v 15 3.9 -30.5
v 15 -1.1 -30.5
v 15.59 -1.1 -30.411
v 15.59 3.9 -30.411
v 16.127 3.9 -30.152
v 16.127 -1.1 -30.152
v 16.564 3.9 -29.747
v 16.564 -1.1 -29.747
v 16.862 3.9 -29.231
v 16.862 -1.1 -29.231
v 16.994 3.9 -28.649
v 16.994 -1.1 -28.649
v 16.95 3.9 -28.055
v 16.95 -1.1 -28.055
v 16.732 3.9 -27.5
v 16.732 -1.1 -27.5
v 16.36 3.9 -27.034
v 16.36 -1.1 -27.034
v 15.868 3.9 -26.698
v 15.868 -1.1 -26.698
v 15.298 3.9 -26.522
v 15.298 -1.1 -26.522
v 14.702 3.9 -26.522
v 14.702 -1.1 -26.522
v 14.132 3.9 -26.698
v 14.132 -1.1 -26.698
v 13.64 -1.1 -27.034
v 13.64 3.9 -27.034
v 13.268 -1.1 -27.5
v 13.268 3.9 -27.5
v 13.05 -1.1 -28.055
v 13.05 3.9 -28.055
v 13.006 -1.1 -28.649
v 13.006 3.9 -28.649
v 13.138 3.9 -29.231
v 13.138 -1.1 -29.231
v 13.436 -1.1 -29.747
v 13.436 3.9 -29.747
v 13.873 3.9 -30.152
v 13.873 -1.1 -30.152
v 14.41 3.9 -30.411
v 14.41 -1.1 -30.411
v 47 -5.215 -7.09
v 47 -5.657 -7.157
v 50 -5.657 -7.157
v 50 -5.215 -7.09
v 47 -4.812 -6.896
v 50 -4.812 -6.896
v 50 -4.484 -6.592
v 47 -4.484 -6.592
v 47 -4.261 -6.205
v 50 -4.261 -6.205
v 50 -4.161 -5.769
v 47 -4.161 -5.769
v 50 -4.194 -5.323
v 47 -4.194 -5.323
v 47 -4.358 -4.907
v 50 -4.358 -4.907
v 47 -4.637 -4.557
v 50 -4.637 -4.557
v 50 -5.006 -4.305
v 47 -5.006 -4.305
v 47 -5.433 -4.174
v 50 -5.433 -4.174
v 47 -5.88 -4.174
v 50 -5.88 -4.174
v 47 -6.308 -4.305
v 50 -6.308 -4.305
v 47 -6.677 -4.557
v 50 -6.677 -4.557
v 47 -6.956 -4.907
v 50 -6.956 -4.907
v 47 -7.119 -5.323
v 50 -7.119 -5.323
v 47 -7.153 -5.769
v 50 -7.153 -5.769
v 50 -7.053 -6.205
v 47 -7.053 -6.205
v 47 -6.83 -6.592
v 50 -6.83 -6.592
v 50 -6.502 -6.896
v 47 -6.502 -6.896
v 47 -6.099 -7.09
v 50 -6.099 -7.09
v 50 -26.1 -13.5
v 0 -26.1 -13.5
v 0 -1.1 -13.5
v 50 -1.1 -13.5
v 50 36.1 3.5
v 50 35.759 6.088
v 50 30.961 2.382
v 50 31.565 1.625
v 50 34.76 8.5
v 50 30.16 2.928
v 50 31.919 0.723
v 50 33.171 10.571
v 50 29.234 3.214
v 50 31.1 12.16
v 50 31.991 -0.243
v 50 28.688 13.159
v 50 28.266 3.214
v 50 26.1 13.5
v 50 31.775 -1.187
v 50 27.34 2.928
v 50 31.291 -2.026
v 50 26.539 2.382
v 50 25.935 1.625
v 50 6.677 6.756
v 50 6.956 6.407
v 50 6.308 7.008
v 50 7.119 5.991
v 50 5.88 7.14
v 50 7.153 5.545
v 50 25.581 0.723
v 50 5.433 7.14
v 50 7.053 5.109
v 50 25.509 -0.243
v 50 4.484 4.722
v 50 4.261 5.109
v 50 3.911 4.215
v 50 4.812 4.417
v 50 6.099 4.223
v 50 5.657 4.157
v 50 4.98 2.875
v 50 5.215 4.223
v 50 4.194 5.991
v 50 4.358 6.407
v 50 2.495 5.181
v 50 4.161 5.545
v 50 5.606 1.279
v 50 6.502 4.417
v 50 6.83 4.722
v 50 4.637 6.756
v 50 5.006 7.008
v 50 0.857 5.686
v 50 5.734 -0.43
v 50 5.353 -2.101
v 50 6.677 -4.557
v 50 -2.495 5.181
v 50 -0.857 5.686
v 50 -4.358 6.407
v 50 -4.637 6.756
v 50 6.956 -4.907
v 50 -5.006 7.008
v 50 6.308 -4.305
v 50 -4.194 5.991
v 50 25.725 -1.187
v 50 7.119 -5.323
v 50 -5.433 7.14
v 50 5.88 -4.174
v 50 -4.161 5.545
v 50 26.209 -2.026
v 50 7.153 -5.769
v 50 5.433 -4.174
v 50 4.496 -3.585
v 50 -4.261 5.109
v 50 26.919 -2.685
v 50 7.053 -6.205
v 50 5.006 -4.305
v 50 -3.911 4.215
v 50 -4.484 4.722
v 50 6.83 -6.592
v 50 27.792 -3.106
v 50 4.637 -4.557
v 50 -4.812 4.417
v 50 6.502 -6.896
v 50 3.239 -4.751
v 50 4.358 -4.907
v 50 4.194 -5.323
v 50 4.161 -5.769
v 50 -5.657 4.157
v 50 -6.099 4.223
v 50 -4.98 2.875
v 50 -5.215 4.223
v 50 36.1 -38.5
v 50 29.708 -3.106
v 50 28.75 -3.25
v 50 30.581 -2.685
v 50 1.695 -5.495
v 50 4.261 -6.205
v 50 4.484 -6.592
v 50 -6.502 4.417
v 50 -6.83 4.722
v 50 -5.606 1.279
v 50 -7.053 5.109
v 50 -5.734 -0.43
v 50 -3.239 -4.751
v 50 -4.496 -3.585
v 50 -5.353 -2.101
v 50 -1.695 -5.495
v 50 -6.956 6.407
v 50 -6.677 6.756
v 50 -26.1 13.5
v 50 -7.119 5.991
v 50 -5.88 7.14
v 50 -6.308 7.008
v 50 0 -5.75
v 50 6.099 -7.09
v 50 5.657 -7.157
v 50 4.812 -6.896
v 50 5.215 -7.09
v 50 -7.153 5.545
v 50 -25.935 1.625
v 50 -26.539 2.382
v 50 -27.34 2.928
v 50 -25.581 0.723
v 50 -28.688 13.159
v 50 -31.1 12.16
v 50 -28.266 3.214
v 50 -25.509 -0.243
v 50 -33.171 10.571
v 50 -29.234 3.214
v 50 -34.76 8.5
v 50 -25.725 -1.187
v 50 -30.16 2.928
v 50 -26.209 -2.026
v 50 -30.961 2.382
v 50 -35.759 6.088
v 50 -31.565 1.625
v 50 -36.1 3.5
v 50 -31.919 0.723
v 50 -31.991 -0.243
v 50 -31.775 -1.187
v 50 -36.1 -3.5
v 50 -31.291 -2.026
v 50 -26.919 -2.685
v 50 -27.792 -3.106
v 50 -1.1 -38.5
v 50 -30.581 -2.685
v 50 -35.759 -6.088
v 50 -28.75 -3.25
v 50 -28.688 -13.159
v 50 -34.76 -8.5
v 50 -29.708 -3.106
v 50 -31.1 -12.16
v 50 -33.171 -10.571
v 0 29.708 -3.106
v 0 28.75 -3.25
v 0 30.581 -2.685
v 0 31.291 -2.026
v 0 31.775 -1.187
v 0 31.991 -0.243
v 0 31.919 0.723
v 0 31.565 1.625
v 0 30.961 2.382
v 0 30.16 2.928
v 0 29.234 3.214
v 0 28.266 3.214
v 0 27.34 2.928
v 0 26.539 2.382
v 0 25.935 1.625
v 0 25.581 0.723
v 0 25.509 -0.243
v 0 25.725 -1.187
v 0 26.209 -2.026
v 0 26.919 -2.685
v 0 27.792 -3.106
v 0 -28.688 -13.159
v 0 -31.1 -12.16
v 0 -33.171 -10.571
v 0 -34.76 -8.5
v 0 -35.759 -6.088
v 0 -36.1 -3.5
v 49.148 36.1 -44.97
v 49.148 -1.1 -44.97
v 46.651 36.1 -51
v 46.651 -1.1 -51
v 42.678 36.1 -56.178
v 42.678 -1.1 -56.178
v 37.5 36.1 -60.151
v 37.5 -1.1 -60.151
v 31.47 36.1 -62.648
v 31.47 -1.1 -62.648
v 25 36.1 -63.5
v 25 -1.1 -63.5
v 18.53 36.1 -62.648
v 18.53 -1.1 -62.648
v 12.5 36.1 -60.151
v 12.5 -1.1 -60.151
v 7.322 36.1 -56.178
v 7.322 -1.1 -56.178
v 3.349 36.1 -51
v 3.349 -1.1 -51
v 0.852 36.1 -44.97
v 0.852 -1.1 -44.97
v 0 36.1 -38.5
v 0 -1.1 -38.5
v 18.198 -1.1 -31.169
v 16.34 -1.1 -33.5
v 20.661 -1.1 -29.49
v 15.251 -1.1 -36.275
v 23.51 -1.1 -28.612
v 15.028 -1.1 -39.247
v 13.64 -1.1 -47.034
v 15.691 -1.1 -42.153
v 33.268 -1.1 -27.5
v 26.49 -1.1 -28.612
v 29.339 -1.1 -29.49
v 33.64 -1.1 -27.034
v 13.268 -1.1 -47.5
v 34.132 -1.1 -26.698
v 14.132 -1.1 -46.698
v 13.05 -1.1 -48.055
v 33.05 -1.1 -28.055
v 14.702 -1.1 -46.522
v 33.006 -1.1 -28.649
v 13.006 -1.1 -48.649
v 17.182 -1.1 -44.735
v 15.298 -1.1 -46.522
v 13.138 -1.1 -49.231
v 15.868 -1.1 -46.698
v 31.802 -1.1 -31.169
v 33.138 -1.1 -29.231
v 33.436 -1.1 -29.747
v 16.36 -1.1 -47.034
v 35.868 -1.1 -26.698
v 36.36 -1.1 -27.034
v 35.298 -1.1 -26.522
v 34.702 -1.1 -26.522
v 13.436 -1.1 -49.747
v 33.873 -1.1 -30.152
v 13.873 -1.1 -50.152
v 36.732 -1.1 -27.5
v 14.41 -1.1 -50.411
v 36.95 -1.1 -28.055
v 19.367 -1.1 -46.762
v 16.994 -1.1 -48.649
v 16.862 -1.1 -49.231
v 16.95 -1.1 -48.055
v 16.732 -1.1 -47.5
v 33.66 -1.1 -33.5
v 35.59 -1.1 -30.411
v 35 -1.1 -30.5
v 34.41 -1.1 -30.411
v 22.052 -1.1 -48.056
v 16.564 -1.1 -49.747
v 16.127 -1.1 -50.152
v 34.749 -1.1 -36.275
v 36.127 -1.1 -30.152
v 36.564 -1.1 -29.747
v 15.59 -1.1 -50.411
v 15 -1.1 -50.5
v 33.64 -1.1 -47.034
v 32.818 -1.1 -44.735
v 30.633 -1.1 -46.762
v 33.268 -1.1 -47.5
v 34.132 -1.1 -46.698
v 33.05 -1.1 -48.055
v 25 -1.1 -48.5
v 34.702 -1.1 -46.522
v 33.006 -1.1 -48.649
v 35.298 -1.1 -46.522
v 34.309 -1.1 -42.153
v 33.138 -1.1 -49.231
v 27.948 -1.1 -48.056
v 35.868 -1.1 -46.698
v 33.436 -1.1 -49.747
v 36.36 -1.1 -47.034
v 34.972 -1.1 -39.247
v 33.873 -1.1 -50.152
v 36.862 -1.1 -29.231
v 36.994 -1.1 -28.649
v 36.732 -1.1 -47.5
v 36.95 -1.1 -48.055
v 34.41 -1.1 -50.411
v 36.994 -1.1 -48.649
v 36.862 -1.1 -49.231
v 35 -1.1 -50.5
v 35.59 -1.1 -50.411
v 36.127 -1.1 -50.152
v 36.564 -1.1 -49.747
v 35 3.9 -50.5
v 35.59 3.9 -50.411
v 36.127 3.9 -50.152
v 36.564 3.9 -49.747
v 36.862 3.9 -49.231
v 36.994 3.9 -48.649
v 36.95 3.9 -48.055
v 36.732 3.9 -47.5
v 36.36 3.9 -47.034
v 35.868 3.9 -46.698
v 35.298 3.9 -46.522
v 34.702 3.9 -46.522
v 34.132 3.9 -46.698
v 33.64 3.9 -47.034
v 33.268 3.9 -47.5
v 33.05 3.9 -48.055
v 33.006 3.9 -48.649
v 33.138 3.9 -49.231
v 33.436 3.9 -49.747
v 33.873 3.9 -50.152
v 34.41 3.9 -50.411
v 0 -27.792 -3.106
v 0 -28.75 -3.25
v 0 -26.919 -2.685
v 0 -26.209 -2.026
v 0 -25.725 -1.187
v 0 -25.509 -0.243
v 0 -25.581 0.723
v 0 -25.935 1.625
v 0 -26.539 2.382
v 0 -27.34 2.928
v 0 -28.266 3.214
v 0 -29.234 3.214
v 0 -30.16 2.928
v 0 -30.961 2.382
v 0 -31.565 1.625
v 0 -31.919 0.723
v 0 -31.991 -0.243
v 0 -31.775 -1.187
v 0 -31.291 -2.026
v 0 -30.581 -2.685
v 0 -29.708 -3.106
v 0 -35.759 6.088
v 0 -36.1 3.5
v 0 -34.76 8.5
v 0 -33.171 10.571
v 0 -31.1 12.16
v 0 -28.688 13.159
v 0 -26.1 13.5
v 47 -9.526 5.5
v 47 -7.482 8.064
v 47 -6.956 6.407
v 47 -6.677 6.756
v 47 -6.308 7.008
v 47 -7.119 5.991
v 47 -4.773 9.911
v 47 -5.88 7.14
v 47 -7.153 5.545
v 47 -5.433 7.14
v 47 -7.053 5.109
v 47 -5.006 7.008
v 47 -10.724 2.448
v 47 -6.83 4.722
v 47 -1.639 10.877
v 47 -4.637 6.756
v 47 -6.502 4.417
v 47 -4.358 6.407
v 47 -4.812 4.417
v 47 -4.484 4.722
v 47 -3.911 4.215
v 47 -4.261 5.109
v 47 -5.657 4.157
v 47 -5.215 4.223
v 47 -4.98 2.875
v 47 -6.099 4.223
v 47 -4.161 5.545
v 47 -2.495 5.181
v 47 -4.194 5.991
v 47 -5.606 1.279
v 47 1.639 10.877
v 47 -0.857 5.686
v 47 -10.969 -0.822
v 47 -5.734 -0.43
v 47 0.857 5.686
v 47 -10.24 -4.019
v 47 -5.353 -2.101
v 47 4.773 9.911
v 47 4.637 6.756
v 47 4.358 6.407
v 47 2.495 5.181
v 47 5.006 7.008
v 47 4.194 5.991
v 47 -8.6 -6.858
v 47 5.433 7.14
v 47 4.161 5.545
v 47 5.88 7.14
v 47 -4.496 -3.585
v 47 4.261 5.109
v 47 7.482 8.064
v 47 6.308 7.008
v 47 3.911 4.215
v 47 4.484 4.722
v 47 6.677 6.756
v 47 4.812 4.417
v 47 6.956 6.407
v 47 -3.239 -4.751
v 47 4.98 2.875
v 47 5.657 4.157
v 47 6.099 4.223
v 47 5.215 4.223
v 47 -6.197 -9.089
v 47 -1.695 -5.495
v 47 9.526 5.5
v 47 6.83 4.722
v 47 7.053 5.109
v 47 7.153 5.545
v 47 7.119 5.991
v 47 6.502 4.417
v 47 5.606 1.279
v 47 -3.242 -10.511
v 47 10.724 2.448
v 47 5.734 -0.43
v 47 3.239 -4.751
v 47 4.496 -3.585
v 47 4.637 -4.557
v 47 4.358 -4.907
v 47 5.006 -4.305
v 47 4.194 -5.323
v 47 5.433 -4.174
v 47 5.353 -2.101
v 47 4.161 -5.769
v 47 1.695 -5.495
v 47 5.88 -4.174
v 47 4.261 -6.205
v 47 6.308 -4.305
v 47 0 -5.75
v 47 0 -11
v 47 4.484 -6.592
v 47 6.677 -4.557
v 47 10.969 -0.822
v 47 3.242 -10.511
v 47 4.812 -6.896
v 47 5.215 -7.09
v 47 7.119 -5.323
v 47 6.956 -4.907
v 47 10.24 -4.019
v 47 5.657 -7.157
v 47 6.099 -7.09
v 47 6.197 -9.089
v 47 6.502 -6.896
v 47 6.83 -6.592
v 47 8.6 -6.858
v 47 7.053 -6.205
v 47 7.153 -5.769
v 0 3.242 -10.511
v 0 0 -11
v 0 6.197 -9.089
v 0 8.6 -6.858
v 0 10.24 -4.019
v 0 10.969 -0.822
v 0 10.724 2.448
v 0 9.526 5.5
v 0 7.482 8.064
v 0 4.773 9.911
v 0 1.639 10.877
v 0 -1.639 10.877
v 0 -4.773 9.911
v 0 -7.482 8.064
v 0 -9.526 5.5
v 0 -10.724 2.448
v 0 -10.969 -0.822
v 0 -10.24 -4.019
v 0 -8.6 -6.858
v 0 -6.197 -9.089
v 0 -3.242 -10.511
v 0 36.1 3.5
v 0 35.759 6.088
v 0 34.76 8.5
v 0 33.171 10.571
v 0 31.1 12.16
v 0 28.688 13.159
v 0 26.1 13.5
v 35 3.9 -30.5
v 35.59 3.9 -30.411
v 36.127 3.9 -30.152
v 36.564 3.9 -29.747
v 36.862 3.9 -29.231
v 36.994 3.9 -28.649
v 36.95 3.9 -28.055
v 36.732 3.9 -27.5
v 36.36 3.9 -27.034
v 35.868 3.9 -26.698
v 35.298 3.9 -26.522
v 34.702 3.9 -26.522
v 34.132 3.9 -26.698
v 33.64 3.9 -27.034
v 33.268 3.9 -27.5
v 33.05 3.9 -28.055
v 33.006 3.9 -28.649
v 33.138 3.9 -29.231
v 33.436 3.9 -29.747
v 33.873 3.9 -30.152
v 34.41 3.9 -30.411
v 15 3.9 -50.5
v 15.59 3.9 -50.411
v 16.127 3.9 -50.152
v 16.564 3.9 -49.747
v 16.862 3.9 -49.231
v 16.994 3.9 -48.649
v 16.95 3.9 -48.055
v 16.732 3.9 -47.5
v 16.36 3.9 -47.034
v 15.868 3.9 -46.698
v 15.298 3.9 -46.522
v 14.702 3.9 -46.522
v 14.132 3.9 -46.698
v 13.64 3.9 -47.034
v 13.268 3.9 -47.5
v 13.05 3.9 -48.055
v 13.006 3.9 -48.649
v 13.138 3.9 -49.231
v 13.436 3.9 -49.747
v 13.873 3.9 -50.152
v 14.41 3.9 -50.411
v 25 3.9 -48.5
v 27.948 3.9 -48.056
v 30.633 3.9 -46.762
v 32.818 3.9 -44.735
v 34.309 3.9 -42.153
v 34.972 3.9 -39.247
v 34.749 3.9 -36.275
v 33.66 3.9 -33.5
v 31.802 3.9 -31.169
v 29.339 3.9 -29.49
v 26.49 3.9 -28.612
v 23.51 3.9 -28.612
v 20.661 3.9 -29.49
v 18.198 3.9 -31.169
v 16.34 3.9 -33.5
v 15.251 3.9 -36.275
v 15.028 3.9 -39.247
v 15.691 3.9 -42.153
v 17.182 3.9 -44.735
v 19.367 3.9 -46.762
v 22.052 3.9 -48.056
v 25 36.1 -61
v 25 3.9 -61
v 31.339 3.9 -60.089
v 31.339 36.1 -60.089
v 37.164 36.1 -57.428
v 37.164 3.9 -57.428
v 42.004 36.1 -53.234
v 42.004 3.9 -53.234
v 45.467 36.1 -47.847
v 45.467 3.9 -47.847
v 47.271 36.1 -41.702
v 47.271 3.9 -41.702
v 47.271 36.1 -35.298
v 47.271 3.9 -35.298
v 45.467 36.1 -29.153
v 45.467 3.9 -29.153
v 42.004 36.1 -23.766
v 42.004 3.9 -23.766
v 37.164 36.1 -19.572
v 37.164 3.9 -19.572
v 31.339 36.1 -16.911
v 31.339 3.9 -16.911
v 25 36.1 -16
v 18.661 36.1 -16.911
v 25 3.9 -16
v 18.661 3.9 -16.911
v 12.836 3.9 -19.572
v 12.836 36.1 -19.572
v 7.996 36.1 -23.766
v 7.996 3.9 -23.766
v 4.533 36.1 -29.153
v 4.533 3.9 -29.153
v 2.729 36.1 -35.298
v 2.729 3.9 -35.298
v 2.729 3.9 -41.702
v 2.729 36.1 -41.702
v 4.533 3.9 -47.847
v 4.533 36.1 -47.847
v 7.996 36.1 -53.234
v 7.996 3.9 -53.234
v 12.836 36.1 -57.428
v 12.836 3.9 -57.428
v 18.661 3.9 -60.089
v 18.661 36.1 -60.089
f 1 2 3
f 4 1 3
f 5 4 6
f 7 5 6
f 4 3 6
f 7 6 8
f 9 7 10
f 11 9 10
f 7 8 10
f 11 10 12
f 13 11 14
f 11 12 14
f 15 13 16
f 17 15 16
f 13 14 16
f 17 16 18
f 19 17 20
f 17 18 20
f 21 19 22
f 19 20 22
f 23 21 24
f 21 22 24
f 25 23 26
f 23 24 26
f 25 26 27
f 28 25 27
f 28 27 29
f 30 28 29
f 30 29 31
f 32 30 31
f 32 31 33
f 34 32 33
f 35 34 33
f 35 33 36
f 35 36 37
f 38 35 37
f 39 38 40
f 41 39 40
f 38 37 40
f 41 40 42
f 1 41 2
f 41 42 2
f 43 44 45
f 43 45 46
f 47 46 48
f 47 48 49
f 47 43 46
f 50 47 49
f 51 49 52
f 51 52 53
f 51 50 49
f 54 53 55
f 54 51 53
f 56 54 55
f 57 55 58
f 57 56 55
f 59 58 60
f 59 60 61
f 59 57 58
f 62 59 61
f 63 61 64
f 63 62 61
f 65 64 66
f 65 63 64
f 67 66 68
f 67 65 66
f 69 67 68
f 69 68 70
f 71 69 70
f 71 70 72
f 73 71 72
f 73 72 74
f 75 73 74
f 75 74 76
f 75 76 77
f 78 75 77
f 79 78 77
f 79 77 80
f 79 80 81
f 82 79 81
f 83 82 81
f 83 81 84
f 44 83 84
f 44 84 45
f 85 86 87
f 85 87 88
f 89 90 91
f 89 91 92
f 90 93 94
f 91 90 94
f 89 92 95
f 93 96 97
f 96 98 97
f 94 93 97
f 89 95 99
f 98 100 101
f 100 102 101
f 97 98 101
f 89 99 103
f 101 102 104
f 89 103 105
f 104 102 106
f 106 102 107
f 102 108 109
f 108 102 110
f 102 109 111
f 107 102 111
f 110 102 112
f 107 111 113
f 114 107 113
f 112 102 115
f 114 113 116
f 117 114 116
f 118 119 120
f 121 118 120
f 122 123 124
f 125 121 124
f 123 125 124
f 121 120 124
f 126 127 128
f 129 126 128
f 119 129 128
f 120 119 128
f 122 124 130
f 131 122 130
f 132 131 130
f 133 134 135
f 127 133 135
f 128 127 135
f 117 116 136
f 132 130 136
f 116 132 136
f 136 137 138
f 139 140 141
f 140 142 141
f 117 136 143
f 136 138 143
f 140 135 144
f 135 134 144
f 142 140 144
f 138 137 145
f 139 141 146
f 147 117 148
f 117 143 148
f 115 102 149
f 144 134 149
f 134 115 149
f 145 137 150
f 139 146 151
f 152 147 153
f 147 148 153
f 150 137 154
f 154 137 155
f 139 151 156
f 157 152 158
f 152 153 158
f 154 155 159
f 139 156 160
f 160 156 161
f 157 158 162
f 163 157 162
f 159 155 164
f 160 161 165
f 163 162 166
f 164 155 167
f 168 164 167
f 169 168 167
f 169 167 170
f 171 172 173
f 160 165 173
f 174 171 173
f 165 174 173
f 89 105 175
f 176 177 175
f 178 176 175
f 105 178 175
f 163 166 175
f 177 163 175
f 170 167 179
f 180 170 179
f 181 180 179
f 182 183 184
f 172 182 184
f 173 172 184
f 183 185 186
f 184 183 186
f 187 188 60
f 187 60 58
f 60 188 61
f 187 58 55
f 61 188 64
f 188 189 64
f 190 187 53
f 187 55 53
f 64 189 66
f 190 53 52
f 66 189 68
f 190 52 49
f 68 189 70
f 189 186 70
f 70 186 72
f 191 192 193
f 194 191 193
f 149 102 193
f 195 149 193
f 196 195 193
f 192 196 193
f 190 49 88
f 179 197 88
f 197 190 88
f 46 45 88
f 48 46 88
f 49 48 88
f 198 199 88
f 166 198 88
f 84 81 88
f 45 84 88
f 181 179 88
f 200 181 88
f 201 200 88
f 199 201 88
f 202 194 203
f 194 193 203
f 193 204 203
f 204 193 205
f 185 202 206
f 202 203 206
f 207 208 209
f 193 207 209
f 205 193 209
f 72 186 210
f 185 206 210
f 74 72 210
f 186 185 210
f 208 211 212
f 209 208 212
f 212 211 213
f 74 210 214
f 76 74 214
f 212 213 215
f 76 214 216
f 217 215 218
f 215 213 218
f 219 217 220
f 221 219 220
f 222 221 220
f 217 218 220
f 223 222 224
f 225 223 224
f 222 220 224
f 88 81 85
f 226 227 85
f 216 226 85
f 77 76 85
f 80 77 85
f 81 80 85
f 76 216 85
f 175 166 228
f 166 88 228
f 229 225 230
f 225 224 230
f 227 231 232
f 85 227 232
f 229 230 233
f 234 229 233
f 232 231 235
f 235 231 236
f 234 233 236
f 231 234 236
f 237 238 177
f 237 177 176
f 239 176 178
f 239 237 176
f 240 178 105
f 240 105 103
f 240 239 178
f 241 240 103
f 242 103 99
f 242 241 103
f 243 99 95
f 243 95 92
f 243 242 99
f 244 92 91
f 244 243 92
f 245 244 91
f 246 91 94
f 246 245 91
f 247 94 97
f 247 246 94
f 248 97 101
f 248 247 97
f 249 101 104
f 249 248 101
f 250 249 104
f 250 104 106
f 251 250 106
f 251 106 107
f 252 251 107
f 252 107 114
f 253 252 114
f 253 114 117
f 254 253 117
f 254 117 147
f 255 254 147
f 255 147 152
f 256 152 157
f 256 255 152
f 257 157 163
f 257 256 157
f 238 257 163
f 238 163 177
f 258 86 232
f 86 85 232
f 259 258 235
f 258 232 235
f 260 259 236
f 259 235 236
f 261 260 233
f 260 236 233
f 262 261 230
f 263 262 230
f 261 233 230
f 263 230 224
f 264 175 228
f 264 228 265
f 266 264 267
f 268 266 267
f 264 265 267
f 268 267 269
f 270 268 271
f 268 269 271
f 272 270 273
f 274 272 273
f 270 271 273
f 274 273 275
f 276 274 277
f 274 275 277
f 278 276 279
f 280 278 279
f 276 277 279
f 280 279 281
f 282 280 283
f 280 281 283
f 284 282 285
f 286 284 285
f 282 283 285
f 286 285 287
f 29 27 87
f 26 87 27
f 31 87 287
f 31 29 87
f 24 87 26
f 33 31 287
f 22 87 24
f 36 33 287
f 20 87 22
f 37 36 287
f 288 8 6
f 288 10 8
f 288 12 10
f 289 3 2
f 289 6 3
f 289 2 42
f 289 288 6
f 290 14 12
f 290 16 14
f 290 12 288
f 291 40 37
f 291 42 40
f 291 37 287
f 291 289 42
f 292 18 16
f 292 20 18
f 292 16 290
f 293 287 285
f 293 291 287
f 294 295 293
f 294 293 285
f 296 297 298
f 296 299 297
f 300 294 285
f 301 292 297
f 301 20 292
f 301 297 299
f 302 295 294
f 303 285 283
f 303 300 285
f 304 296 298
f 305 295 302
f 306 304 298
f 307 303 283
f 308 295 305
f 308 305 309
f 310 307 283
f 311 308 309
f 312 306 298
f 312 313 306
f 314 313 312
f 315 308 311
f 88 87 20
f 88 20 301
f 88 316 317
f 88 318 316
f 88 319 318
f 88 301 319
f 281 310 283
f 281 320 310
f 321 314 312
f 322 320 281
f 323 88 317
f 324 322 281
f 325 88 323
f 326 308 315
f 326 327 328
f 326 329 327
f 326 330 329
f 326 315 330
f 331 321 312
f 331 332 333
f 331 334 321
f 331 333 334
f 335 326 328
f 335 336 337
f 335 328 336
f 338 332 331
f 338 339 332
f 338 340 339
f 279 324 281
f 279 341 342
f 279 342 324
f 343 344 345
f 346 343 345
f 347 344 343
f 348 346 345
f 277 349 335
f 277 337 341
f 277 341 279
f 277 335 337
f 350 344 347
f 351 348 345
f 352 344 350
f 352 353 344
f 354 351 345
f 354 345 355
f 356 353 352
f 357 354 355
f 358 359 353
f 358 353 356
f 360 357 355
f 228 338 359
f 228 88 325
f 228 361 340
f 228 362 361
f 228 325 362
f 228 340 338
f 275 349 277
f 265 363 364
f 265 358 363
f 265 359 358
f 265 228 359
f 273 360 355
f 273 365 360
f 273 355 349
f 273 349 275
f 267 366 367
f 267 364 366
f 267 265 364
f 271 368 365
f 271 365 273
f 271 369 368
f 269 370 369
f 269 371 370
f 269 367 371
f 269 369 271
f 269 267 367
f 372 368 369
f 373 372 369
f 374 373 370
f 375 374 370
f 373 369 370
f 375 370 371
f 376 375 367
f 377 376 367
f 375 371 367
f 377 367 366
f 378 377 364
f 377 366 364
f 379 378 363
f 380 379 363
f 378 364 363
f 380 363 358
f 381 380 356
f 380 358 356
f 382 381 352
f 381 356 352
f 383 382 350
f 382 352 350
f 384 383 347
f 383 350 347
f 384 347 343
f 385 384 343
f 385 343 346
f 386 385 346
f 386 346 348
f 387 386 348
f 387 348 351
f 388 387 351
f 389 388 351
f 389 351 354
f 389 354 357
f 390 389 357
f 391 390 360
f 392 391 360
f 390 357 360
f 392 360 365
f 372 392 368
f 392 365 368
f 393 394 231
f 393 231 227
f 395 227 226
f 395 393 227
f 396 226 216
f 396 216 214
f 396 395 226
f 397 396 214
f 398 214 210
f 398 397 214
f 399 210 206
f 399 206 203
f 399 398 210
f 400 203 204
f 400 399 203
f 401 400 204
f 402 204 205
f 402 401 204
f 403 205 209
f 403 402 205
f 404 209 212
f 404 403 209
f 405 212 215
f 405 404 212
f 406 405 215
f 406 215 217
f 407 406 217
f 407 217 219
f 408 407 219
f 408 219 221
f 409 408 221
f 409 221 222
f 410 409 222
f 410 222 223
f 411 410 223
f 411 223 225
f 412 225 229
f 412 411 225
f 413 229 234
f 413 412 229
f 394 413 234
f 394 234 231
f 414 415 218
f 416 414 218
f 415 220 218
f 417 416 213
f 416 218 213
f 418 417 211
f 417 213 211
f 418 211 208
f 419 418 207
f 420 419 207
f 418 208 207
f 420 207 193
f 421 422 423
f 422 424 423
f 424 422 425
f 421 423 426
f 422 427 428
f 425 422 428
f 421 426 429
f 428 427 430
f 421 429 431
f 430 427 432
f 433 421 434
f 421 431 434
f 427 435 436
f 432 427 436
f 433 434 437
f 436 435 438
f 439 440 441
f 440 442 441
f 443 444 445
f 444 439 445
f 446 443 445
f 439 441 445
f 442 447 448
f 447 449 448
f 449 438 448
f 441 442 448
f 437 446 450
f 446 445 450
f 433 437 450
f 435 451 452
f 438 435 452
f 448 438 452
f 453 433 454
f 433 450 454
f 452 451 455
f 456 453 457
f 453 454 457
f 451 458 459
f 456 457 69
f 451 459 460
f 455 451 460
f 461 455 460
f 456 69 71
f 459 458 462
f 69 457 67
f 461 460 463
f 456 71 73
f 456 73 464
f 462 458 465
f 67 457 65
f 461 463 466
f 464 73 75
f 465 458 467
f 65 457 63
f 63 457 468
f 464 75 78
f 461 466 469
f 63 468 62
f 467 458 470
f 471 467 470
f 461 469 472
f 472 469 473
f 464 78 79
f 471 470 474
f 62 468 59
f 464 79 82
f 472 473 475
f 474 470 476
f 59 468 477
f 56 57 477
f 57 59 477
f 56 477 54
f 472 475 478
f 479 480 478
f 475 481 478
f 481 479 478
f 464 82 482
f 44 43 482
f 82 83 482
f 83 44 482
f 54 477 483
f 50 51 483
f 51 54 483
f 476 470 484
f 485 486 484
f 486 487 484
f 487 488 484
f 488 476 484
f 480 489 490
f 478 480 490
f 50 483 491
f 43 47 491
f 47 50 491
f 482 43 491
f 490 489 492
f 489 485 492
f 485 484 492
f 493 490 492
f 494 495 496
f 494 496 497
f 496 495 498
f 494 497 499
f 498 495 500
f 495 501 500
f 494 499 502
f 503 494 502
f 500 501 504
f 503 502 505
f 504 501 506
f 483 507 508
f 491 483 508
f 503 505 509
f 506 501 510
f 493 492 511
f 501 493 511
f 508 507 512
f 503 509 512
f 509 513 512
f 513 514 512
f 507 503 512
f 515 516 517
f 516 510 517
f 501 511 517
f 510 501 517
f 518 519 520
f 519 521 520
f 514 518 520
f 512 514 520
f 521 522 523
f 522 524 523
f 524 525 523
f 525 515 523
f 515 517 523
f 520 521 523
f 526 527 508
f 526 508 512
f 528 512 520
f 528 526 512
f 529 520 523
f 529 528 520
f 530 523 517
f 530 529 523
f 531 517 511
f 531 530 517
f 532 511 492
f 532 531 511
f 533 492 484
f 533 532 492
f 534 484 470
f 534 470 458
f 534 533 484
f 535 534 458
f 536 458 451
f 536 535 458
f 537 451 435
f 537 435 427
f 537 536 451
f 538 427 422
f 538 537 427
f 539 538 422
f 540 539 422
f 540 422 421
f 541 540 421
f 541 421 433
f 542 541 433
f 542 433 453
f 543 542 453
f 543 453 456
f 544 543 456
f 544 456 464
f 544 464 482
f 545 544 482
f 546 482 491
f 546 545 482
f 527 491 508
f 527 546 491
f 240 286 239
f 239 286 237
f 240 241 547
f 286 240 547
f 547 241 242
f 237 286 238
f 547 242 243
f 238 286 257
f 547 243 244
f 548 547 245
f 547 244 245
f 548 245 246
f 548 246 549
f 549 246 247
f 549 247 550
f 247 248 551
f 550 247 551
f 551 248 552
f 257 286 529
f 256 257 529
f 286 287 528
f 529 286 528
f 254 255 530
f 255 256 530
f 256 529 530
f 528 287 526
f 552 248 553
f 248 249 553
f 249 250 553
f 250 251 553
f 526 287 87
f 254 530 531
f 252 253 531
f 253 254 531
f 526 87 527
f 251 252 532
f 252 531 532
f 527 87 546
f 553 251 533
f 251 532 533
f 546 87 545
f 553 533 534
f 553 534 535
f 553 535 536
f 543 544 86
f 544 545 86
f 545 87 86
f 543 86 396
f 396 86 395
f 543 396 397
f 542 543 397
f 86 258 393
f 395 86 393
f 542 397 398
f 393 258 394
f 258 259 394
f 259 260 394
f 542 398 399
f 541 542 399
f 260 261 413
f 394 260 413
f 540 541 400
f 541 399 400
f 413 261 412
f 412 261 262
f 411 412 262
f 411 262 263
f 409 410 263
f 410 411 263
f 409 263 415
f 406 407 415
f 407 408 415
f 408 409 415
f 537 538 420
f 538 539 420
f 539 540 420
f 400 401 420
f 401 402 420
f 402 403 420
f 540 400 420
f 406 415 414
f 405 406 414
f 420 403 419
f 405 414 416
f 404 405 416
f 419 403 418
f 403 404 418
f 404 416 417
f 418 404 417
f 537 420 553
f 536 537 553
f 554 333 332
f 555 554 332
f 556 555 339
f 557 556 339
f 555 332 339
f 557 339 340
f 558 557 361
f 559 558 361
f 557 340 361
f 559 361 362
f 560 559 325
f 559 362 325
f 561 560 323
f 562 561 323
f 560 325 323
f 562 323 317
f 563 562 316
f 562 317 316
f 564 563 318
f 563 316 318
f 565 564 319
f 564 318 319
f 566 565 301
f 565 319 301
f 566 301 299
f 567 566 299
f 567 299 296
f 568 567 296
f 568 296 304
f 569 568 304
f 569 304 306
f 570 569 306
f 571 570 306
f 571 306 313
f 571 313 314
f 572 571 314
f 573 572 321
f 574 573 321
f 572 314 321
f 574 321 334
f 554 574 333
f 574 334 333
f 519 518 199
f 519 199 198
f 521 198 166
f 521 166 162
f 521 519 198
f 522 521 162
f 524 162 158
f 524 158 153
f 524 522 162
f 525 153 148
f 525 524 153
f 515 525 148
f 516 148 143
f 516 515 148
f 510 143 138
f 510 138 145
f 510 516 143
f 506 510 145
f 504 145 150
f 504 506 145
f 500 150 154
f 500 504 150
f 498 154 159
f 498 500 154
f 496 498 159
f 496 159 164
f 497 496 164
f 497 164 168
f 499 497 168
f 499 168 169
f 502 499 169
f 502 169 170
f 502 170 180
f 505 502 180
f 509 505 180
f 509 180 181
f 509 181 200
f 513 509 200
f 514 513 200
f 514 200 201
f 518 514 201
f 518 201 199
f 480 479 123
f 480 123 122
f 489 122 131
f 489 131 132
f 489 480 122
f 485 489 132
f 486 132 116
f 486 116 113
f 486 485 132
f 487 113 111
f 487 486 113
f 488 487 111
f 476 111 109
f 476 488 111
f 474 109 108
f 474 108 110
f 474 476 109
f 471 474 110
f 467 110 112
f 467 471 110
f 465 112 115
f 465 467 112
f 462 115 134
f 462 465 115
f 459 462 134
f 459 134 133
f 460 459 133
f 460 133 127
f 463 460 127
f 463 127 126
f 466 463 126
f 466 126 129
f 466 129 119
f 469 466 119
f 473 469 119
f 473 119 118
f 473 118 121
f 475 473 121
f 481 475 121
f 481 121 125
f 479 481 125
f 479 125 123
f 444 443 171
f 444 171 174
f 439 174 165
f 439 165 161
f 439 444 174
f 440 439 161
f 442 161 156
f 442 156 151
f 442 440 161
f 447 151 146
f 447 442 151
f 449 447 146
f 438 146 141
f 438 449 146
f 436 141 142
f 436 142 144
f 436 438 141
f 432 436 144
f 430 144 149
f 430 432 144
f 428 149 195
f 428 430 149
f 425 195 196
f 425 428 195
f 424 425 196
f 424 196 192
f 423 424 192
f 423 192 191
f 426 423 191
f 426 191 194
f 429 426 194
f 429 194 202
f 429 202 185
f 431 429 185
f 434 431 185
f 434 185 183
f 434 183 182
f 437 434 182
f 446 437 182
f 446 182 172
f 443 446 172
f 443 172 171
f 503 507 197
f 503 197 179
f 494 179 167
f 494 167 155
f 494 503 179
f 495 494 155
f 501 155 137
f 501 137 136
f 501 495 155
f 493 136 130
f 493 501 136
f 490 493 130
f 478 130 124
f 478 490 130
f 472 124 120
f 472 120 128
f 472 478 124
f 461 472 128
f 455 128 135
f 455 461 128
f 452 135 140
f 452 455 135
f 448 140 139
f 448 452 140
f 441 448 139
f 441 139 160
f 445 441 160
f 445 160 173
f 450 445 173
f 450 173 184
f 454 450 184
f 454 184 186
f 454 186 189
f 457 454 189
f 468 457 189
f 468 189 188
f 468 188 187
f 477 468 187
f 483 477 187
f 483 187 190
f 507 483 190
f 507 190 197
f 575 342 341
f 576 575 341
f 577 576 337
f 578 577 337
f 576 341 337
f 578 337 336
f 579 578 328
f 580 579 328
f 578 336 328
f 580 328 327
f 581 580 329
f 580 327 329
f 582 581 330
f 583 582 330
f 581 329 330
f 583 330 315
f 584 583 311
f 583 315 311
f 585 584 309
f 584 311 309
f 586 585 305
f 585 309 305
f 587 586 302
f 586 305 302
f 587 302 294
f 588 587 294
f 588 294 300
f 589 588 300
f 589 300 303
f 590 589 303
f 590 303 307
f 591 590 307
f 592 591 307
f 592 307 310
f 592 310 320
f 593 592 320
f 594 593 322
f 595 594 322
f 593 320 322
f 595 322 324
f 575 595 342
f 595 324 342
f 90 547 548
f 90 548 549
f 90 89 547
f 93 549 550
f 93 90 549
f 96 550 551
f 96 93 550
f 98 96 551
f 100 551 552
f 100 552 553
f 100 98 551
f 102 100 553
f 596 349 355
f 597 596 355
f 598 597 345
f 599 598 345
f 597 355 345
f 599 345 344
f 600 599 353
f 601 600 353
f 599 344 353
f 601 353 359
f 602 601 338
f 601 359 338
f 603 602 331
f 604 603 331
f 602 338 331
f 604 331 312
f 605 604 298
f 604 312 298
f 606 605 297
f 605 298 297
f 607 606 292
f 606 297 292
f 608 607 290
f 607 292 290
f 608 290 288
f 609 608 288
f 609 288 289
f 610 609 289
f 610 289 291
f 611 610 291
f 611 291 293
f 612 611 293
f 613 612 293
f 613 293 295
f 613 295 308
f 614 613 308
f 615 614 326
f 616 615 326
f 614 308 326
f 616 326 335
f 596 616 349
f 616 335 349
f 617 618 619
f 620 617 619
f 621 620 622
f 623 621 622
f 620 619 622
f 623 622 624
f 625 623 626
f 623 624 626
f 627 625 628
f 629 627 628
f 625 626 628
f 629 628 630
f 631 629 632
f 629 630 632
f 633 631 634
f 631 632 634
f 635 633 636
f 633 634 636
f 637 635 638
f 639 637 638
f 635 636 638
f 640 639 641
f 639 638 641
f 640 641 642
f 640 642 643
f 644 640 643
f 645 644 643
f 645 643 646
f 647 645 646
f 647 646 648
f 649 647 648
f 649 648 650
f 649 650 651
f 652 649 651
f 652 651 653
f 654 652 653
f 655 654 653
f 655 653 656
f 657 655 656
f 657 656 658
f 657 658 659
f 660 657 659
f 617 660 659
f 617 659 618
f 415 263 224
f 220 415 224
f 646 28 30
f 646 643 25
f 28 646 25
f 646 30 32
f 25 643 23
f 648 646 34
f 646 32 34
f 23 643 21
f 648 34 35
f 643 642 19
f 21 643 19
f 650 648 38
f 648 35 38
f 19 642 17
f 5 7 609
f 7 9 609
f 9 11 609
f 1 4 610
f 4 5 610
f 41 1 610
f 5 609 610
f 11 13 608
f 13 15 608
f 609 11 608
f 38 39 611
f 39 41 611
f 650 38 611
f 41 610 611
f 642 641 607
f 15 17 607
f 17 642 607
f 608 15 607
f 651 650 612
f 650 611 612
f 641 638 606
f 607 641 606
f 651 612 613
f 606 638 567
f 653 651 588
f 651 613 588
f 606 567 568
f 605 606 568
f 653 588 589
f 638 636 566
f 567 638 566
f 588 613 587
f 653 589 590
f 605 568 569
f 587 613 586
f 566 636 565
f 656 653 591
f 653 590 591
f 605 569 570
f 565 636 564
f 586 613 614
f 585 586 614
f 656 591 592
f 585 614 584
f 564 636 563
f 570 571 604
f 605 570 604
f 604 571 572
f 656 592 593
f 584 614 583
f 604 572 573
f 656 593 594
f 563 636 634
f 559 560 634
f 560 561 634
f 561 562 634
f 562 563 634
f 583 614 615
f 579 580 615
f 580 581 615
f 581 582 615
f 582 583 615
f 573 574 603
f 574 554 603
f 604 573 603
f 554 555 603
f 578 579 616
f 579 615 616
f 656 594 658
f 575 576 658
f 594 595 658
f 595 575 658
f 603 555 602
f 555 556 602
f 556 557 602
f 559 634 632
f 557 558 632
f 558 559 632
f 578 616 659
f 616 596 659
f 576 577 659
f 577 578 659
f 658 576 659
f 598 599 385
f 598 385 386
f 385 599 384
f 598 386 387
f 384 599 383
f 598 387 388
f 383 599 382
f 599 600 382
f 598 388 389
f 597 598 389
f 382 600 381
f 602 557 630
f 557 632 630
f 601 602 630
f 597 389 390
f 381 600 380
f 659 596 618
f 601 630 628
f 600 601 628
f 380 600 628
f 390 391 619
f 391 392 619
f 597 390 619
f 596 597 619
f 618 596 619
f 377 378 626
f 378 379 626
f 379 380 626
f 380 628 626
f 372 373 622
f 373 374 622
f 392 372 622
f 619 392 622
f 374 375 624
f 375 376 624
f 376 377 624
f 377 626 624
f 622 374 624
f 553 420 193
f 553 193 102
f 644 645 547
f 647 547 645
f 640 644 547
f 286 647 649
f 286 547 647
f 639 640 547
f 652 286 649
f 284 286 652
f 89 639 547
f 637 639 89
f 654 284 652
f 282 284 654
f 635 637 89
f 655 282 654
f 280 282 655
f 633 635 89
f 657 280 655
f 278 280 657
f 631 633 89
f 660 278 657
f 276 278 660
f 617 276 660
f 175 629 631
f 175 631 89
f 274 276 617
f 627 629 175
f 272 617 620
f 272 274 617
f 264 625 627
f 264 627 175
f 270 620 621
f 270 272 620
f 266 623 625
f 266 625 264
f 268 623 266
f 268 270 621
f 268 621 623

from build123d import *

# Parameters (mm, degrees)
SKETCH1_W           = 27
SKETCH1_H           = 72.2
SKETCH1_R           = 11
SKETCH1_R_2         = 3.25
SKETCH1_R_3         = 5.75
SKETCH1_R_4         = 1.5
BOSS_EXTRUDE1_DEPTH = 50
BOSS_EXTRUDE3_DEPTH = 72.2
CUT_EXTRUDE2_DEPTH  = 35
SKETCH1_3_R         = 11
SKETCH1_3_R_2       = 5.75
SKETCH1_3_R_3       = 1.5
CUT_EXTRUDE1_DEPTH  = 47
SKETCH3_R           = 22.5
SKETCH3_R_2         = 10
SKETCH3_R_3         = 2
CUT_EXTRUDE3_DEPTH  = 37.2
SKETCH3_6_R         = 22.5
SKETCH3_6_R_2       = 2
SKETCH3_6_R_3       = 10
BOSS_EXTRUDE4_DEPTH = 5
FILLET1_R           = 10


# Read off the part's stored shape, not the designer's step: Cut-Extrude2
with BuildPart() as part:
    # Sketch1 → Boss-Extrude1 (new body)
    # profile 1 of 2: a face of its own
    with BuildSketch(Plane(origin=(0, 0, 0), x_dir=(0, 0, -1), z_dir=(1, 0, 0))):
        Rectangle(SKETCH1_W, SKETCH1_H)
        Circle(SKETCH1_R, mode=Mode.SUBTRACT)
        with Locations((0, -28.75)):
            Circle(SKETCH1_R_2, mode=Mode.SUBTRACT)
        with Locations((0, 28.75)):
            Circle(SKETCH1_R_2, mode=Mode.SUBTRACT)
    # profile 2 of 2: a face of its own
    with BuildSketch(Plane(origin=(0, 0, 0), x_dir=(0, 0, -1), z_dir=(1, 0, 0))):
        Circle(SKETCH1_R)
        Circle(SKETCH1_R_3, mode=Mode.SUBTRACT)
        with Locations((-5.656854249, 5.656854249)):
            Circle(SKETCH1_R_4, mode=Mode.SUBTRACT)
        with Locations((5.656854249, 5.656854249)):
            Circle(SKETCH1_R_4, mode=Mode.SUBTRACT)
        with Locations((5.656854249, -5.656854249)):
            Circle(SKETCH1_R_4, mode=Mode.SUBTRACT)
        with Locations((-5.656854249, -5.656854249)):
            Circle(SKETCH1_R_4, mode=Mode.SUBTRACT)
    extrude(amount=BOSS_EXTRUDE1_DEPTH)

    # Sketch2 → Boss-Extrude3 (add)
    with BuildSketch(Plane(origin=(0, -36.1, 0), x_dir=(1, 0, 0), z_dir=(0, 1, 0))):
        with BuildLine():
            Line((0, 13.5), (25, 13.5))
            ThreePointArc((25, 13.5), (7.32233047, 20.82233047), (0, 38.5))
            Line((0, 38.5), (0, 13.5))
        make_face()
        with BuildLine():
            ThreePointArc((25, 13.5), (42.67766953, 20.82233047), (50, 38.5))
            Line((50, 38.5), (0, 38.5))
            ThreePointArc((0, 38.5), (7.32233047, 20.82233047), (25, 13.5))
        make_face()
        with BuildLine():
            Line((25, 13.5), (50, 13.5))
            Line((50, 13.5), (50, 38.5))
            ThreePointArc((50, 38.5), (42.67766953, 20.82233047), (25, 13.5))
        make_face()
        with BuildLine():
            Line((0, 38.5), (50, 38.5))
            ThreePointArc((50, 38.5), (25, 63.5), (0, 38.5))
        make_face()
    extrude(amount=BOSS_EXTRUDE3_DEPTH)

    # Cut-Extrude2 outline → Cut-Extrude2 (cut)
    with BuildSketch(Plane(origin=(0, -36.1, 0), x_dir=(1, 0, 0), z_dir=(0, 1, 0))):
        with BuildLine():
            Line((0, 13.5), (50, 13.5))
            Line((50, 13.5), (50, 38.5))
            ThreePointArc((50, 38.5), (25, 63.5), (0, 38.5))
            Line((0, 38.5), (0, 13.5))
        make_face()
    extrude(amount=CUT_EXTRUDE2_DEPTH, mode=Mode.SUBTRACT)

    # Sketch1<3> → Cut-Extrude1 (cut)
    with BuildSketch(Plane(origin=(0, 0, 0), x_dir=(0, 0, -1), z_dir=(1, 0, 0))):
        Circle(SKETCH1_3_R)
        Circle(SKETCH1_3_R_2, mode=Mode.SUBTRACT)
        with Locations((-5.656854249, 5.656854249)):
            Circle(SKETCH1_3_R_3, mode=Mode.SUBTRACT)
        with Locations((5.656854249, 5.656854249)):
            Circle(SKETCH1_3_R_3, mode=Mode.SUBTRACT)
        with Locations((5.656854249, -5.656854249)):
            Circle(SKETCH1_3_R_3, mode=Mode.SUBTRACT)
        with Locations((-5.656854249, -5.656854249)):
            Circle(SKETCH1_3_R_3, mode=Mode.SUBTRACT)
    extrude(amount=CUT_EXTRUDE1_DEPTH, mode=Mode.SUBTRACT)

    # Sketch3 → Cut-Extrude3 (cut)
    # profile 1 of 6: a face of its own
    with BuildSketch(Plane.XZ.offset(1.1)):
        with Locations(Location((25, -38.5, 0), (0, 0, 270))):
            Circle(SKETCH3_R)
        with Locations((25, -38.5)):
            Circle(SKETCH3_R_2, mode=Mode.SUBTRACT)
        with Locations((15, -48.5)):
            Circle(SKETCH3_R_3, mode=Mode.SUBTRACT)
        with Locations((35, -48.5)):
            Circle(SKETCH3_R_3, mode=Mode.SUBTRACT)
        with Locations((35, -28.5)):
            Circle(SKETCH3_R_3, mode=Mode.SUBTRACT)
        with Locations((15, -28.5)):
            Circle(SKETCH3_R_3, mode=Mode.SUBTRACT)
    # profile 2 of 6: a face of its own
    with BuildSketch(Plane.XZ.offset(1.1)):
        with Locations((25, -38.5)):
            Circle(SKETCH3_R_2)
    # profile 3 of 6: a face of its own
    with BuildSketch(Plane.XZ.offset(1.1)):
        with Locations((35, -28.5)):
            Circle(SKETCH3_R_3)
    # profile 4 of 6: a face of its own
    with BuildSketch(Plane.XZ.offset(1.1)):
        with Locations((15, -28.5)):
            Circle(SKETCH3_R_3)
    # profile 5 of 6: a face of its own
    with BuildSketch(Plane.XZ.offset(1.1)):
        with Locations((15, -48.5)):
            Circle(SKETCH3_R_3)
    # profile 6 of 6: a face of its own
    with BuildSketch(Plane.XZ.offset(1.1)):
        with Locations((35, -48.5)):
            Circle(SKETCH3_R_3)
    extrude(amount=-CUT_EXTRUDE3_DEPTH, mode=Mode.SUBTRACT)

    # Sketch3<6> → Boss-Extrude4 (add)
    with BuildSketch(Plane.XZ.offset(1.1)):
        with Locations(Location((25, -38.5, 0), (0, 0, 270))):
            Circle(SKETCH3_6_R)
        with Locations(Location((15, -28.5, 0), (0, 0, 270))):
            Circle(SKETCH3_6_R_2, mode=Mode.SUBTRACT)
        with Locations(Location((35, -28.5, 0), (0, 0, 270))):
            Circle(SKETCH3_6_R_2, mode=Mode.SUBTRACT)
        with Locations(Location((35, -48.5, 0), (0, 0, 270))):
            Circle(SKETCH3_6_R_2, mode=Mode.SUBTRACT)
        with Locations(Location((15, -48.5, 0), (0, 0, 270))):
            Circle(SKETCH3_6_R_2, mode=Mode.SUBTRACT)
        with Locations(Location((25, -38.5, 0), (0, 0, 270))):
            Circle(SKETCH3_6_R_3, mode=Mode.SUBTRACT)
    extrude(amount=-BOSS_EXTRUDE4_DEPTH)

    # Fillet1
    fillet1_edges = [part.edges().sort_by_distance(p)[0] for p in [
        (25, 36.1, 13.5),
        (25, -36.1, 13.5),
        (25, -36.1, -13.5),
    ]]
    fillet(fillet1_edges, radius=FILLET1_R)


solid = part.part
